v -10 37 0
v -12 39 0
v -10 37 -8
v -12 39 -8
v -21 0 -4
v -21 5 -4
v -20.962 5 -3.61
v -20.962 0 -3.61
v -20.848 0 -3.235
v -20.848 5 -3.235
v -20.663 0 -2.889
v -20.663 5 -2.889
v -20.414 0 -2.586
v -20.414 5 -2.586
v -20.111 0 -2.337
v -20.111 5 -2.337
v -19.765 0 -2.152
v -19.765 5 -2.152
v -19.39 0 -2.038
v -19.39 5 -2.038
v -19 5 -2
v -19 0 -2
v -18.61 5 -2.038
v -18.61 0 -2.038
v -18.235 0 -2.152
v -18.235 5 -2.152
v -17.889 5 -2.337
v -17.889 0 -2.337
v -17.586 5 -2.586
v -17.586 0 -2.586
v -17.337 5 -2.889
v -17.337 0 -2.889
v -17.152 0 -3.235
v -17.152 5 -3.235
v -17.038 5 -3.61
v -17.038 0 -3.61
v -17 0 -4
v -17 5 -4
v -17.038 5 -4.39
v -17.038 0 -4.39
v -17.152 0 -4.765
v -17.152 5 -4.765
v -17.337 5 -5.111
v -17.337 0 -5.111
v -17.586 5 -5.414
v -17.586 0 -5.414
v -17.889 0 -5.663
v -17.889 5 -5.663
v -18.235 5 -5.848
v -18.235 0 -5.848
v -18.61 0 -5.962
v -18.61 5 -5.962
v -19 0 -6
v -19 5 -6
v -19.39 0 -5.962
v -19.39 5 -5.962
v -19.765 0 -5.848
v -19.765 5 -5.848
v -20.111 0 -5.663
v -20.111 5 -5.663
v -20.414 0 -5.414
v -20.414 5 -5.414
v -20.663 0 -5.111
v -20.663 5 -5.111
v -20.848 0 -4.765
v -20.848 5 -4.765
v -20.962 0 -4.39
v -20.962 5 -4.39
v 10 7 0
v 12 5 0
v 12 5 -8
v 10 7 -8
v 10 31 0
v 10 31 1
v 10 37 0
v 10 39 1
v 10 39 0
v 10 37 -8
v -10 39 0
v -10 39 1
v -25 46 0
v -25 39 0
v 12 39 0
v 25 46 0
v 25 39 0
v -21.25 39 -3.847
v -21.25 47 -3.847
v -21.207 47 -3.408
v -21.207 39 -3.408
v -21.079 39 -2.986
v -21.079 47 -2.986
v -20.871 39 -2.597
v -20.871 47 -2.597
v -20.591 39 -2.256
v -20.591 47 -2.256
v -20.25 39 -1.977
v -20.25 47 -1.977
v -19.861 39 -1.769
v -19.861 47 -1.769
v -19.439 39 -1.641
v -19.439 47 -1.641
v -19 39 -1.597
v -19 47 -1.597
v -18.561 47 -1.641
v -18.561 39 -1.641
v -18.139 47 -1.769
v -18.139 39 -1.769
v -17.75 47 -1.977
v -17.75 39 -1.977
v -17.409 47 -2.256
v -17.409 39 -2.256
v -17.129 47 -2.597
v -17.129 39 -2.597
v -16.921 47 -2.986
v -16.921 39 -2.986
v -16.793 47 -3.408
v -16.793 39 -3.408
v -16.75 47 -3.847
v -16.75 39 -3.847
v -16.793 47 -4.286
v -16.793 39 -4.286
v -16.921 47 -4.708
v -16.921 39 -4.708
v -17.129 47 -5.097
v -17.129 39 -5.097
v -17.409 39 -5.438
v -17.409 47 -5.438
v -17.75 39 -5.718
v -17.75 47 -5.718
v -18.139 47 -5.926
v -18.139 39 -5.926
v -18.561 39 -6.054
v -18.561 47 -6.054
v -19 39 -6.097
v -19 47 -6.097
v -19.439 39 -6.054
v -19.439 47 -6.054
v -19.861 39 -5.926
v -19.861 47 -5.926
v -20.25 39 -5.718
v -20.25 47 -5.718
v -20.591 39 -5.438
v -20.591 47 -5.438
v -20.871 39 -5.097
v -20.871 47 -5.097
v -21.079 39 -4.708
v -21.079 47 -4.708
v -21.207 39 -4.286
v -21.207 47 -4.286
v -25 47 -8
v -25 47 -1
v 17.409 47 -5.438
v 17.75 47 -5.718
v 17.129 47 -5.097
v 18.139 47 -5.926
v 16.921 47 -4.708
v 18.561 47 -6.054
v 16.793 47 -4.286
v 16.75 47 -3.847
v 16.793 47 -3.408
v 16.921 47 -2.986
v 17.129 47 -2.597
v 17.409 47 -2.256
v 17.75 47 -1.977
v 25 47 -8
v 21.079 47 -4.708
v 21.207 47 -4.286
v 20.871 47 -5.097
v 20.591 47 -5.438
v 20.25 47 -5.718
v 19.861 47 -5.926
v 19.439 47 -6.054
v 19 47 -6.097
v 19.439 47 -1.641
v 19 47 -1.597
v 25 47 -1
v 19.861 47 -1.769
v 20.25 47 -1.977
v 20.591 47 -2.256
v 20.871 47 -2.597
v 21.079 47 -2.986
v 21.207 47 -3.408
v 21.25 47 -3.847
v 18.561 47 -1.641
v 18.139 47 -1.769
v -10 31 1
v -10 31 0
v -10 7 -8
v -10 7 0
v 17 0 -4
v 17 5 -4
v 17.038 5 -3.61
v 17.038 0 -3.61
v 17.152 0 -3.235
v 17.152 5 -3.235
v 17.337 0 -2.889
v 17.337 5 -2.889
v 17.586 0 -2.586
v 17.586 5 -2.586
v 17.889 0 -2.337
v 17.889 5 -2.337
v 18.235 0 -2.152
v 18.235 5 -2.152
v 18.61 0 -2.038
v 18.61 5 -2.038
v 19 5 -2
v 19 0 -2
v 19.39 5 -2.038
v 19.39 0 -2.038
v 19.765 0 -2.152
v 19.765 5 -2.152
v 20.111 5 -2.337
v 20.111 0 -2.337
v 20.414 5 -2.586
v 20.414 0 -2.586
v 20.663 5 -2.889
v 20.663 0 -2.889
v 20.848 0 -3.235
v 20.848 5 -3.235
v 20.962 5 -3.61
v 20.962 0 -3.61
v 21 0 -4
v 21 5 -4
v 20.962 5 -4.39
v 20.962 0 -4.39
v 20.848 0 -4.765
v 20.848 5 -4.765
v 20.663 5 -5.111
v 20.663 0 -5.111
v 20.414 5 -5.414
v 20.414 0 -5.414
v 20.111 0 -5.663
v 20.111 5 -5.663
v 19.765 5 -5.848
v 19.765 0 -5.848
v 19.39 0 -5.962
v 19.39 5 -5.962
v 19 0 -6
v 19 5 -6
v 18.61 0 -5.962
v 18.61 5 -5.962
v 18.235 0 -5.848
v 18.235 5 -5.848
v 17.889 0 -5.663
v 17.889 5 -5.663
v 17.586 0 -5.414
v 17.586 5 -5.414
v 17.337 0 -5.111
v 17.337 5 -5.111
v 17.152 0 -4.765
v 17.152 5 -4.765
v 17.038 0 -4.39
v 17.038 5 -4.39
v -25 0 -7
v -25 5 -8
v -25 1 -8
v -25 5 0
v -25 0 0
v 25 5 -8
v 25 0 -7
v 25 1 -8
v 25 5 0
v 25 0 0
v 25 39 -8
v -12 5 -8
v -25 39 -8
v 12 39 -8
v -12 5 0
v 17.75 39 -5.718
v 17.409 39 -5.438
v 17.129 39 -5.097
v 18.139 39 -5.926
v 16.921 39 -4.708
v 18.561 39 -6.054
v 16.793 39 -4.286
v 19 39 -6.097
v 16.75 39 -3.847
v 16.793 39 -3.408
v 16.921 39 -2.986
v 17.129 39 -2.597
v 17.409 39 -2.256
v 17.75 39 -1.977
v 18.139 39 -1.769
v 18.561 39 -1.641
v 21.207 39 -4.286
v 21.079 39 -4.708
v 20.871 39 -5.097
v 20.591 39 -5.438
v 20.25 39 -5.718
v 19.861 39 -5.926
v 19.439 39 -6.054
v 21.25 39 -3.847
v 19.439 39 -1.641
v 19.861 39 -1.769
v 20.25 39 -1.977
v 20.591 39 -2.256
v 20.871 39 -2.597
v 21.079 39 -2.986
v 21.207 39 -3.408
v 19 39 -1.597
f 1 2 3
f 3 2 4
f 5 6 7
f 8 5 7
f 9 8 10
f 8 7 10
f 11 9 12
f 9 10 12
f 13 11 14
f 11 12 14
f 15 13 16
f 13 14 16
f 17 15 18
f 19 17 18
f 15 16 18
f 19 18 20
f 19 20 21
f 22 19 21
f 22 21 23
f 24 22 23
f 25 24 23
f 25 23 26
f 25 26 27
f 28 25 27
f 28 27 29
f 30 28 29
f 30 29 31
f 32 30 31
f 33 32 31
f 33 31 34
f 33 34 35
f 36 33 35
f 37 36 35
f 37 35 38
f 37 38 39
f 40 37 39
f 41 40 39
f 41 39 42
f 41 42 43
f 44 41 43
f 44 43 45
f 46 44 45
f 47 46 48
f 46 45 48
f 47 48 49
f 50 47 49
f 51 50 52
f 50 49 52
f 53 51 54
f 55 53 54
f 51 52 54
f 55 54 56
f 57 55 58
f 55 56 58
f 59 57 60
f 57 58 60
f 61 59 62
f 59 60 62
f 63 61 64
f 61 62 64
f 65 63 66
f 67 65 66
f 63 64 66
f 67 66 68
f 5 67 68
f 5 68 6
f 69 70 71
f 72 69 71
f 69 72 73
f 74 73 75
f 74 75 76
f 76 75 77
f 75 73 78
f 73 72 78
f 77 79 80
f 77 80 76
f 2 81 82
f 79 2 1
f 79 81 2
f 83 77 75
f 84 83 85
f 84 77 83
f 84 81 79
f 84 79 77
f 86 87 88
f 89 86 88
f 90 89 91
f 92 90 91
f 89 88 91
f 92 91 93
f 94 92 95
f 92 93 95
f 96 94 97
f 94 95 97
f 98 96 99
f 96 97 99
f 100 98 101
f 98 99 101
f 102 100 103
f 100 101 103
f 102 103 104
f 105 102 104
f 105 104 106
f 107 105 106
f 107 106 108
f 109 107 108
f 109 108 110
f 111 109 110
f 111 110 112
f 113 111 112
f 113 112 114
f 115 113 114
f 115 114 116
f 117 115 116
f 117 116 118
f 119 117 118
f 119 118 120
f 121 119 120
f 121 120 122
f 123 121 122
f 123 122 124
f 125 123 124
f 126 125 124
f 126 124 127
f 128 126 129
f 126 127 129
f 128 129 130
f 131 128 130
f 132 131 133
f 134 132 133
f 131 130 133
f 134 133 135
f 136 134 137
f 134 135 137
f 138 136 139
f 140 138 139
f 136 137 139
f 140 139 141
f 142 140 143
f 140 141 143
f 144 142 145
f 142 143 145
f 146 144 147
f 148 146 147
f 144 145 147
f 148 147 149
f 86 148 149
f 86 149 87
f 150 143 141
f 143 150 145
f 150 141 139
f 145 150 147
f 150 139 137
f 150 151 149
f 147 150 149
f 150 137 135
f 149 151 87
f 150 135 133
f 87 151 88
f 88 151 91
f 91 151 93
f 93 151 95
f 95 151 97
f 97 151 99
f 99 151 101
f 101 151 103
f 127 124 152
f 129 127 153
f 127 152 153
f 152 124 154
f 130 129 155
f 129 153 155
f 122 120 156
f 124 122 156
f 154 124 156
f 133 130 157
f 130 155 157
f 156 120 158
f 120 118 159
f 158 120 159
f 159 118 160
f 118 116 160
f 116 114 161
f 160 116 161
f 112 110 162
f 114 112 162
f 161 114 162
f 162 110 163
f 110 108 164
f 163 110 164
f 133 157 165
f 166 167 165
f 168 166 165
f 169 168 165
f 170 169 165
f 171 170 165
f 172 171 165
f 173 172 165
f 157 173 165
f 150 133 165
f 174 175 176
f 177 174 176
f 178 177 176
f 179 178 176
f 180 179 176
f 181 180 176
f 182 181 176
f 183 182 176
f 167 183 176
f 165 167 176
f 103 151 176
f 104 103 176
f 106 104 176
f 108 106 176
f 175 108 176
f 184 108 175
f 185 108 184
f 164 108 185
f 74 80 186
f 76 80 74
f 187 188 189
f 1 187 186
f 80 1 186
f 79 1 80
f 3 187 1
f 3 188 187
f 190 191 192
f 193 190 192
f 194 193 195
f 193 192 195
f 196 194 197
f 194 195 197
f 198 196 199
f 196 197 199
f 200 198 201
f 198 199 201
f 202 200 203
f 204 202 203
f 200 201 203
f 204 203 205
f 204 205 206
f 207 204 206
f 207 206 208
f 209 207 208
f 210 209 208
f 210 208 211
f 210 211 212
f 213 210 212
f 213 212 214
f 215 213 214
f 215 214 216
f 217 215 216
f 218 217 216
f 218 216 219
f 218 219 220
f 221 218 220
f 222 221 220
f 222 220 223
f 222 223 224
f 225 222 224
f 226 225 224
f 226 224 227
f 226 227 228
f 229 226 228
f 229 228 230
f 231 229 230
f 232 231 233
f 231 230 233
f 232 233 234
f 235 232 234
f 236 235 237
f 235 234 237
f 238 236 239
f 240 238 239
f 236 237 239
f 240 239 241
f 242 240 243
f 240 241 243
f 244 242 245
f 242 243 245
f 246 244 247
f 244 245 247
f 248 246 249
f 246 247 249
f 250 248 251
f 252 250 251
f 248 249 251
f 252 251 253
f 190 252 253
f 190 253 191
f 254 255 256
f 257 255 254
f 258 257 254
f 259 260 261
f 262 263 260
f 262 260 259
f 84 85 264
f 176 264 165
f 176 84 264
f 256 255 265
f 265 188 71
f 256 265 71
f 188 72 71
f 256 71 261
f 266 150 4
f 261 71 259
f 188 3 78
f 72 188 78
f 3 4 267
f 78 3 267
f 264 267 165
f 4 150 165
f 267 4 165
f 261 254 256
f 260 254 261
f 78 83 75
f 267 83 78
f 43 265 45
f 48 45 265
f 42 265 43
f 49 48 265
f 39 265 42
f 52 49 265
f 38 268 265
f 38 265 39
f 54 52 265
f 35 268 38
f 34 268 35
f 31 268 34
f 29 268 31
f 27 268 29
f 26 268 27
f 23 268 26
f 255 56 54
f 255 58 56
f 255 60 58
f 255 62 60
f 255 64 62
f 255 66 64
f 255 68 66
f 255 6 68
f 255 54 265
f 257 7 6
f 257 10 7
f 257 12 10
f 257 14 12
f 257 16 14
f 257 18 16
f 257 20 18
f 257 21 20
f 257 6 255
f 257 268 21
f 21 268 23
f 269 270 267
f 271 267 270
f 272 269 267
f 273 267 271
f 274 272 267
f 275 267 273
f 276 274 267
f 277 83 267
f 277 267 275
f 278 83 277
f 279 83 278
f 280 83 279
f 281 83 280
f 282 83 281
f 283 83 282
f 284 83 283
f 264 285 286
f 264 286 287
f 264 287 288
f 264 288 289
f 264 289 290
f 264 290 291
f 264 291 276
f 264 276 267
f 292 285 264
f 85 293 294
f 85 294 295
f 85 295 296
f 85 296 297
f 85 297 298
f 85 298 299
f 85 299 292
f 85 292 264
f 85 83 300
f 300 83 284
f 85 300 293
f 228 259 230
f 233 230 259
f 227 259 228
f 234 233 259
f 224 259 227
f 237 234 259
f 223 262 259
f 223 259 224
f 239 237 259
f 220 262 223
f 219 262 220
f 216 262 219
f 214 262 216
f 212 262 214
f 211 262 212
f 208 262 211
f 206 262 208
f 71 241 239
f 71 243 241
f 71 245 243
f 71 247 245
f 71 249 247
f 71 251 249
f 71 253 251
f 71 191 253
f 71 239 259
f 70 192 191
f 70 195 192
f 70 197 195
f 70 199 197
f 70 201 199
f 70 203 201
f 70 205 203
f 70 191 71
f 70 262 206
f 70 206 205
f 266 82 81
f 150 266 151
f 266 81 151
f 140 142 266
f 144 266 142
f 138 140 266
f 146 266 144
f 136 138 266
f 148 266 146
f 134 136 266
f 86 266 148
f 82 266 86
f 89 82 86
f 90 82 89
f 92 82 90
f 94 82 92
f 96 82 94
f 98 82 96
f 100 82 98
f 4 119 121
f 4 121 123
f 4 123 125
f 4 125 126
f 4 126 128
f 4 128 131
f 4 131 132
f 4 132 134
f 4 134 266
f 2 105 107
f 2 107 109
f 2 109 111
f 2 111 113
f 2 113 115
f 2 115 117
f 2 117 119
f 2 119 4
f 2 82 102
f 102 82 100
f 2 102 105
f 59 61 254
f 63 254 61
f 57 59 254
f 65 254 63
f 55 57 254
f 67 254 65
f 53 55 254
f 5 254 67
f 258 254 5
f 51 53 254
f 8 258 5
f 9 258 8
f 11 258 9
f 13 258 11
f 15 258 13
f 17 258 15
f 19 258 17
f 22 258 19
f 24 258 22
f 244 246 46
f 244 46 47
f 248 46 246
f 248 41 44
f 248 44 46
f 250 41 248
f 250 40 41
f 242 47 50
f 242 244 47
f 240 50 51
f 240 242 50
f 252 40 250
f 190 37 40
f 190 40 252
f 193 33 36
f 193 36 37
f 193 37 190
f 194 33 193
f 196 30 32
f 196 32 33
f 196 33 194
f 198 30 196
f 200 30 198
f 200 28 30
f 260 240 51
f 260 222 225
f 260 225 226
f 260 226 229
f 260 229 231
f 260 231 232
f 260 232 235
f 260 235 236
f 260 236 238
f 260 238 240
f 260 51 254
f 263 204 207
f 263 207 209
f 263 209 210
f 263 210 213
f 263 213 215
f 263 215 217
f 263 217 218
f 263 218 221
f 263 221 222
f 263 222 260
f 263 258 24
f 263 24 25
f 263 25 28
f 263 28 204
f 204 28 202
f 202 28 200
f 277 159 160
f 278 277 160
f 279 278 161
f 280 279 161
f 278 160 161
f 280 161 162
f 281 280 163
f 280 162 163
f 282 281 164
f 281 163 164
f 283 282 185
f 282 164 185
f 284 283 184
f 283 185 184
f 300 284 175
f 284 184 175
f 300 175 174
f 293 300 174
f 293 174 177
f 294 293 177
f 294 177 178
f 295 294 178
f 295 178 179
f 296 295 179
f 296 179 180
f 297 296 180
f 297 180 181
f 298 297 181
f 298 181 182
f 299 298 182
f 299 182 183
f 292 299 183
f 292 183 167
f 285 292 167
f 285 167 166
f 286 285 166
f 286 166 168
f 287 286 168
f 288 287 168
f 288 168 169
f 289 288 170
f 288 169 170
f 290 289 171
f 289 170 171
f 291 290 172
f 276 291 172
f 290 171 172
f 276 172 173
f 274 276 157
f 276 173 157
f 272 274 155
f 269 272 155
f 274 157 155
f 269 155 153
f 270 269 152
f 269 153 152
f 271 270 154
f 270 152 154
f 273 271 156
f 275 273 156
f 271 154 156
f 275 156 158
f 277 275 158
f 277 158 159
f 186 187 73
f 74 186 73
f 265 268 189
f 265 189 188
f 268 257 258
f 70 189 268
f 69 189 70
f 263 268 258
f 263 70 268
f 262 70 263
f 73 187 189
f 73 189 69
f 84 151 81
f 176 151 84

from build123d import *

# Parameters (mm, degrees)
SKETCH_1_W          = 50
SKETCH_1_H          = 8
EXTRUDE_1_DEPTH     = 8
SKETCH_2_R          = 2
CUT_EXTRUDE_1_DEPTH = 8
SKETCH_3_W          = 20
SKETCH_3_H          = 8
EXTRUDE_2_DEPTH     = 1
SKETCH_4_R          = 2.25
CUT_EXTRUDE_2_DEPTH = 10
SKETCH_4_3_R        = 2.25
CUT_EXTRUDE_3_DEPTH = 10
CHAMFER_1_SIZE      = 2
CHAMFER_2_SIZE      = 1
CHAMFER_3_SIZE      = 1


with BuildPart() as part:
    # ｽｹｯﾁ1 → ﾎﾞｽ - 押し出し1 (new body)
    with BuildSketch(Plane.XY):
        Polygon((0, 0), (25, 0), (25, 5), (-25, 5), (-25, 0), align=None)
        Polygon((0, 5), (10, 5), (10, 39), (-10, 39), (-10, 5), align=None)
        with Locations((0, 43)):
            Rectangle(SKETCH_1_W, SKETCH_1_H)
    extrude(amount=-EXTRUDE_1_DEPTH)

    # ｽｹｯﾁ2 → ｶｯﾄ - 押し出し1 (cut)
    with BuildSketch(Plane(origin=(0, 5, 0), x_dir=(1, 0, 0), z_dir=(0, 1, 0))):
        with Locations((19, 4)):
            Circle(SKETCH_2_R)
        with Locations((-19, 4)):
            Circle(SKETCH_2_R)
    extrude(amount=-CUT_EXTRUDE_1_DEPTH, mode=Mode.SUBTRACT)

    # ｽｹｯﾁ3 → ﾎﾞｽ - 押し出し2 (add)
    with BuildSketch(Plane.XY):
        with Locations((0, 35)):
            Rectangle(SKETCH_3_W, SKETCH_3_H)
    extrude(amount=EXTRUDE_2_DEPTH)

    # ｽｹｯﾁ4 → ｶｯﾄ - 押し出し2 (cut)
    with BuildSketch(Plane(origin=(0, 47, 0), x_dir=(1, 0, 0), z_dir=(0, 1, 0))):
        with Locations((19, 3.847406514)):
            Circle(SKETCH_4_R)
    extrude(amount=-CUT_EXTRUDE_2_DEPTH, mode=Mode.SUBTRACT)

    # ｽｹｯﾁ4<3> → ｶｯﾄ - 押し出し3 (cut)
    with BuildSketch(Plane(origin=(0, 47, 0), x_dir=(1, 0, 0), z_dir=(0, 1, 0))):
        with Locations((19, 3.847406514)):
            Circle(SKETCH_4_3_R)
        with Locations((-19, 3.847406514)):
            Circle(SKETCH_4_3_R)
    extrude(amount=-CUT_EXTRUDE_3_DEPTH, mode=Mode.SUBTRACT)

    # 面取り1
    chamfer_1_edges = [part.edges().sort_by_distance(p)[0] for p in [
        (10, 39, -4),
        (-10, 39, -4),
        (10, 5, -4),
        (-10, 5, -4),
    ]]
    chamfer(chamfer_1_edges, length=CHAMFER_1_SIZE)

    # 面取り2
    chamfer_2_edges = [part.edges().sort_by_distance(p)[0] for p in [
        (0, 47, 0),
    ]]
    chamfer(chamfer_2_edges, length=CHAMFER_2_SIZE)

    # 面取り3
    chamfer_3_edges = [part.edges().sort_by_distance(p)[0] for p in [
        (0, 0, -8),
    ]]
    chamfer(chamfer_3_edges, length=CHAMFER_3_SIZE)


solid = part.part
